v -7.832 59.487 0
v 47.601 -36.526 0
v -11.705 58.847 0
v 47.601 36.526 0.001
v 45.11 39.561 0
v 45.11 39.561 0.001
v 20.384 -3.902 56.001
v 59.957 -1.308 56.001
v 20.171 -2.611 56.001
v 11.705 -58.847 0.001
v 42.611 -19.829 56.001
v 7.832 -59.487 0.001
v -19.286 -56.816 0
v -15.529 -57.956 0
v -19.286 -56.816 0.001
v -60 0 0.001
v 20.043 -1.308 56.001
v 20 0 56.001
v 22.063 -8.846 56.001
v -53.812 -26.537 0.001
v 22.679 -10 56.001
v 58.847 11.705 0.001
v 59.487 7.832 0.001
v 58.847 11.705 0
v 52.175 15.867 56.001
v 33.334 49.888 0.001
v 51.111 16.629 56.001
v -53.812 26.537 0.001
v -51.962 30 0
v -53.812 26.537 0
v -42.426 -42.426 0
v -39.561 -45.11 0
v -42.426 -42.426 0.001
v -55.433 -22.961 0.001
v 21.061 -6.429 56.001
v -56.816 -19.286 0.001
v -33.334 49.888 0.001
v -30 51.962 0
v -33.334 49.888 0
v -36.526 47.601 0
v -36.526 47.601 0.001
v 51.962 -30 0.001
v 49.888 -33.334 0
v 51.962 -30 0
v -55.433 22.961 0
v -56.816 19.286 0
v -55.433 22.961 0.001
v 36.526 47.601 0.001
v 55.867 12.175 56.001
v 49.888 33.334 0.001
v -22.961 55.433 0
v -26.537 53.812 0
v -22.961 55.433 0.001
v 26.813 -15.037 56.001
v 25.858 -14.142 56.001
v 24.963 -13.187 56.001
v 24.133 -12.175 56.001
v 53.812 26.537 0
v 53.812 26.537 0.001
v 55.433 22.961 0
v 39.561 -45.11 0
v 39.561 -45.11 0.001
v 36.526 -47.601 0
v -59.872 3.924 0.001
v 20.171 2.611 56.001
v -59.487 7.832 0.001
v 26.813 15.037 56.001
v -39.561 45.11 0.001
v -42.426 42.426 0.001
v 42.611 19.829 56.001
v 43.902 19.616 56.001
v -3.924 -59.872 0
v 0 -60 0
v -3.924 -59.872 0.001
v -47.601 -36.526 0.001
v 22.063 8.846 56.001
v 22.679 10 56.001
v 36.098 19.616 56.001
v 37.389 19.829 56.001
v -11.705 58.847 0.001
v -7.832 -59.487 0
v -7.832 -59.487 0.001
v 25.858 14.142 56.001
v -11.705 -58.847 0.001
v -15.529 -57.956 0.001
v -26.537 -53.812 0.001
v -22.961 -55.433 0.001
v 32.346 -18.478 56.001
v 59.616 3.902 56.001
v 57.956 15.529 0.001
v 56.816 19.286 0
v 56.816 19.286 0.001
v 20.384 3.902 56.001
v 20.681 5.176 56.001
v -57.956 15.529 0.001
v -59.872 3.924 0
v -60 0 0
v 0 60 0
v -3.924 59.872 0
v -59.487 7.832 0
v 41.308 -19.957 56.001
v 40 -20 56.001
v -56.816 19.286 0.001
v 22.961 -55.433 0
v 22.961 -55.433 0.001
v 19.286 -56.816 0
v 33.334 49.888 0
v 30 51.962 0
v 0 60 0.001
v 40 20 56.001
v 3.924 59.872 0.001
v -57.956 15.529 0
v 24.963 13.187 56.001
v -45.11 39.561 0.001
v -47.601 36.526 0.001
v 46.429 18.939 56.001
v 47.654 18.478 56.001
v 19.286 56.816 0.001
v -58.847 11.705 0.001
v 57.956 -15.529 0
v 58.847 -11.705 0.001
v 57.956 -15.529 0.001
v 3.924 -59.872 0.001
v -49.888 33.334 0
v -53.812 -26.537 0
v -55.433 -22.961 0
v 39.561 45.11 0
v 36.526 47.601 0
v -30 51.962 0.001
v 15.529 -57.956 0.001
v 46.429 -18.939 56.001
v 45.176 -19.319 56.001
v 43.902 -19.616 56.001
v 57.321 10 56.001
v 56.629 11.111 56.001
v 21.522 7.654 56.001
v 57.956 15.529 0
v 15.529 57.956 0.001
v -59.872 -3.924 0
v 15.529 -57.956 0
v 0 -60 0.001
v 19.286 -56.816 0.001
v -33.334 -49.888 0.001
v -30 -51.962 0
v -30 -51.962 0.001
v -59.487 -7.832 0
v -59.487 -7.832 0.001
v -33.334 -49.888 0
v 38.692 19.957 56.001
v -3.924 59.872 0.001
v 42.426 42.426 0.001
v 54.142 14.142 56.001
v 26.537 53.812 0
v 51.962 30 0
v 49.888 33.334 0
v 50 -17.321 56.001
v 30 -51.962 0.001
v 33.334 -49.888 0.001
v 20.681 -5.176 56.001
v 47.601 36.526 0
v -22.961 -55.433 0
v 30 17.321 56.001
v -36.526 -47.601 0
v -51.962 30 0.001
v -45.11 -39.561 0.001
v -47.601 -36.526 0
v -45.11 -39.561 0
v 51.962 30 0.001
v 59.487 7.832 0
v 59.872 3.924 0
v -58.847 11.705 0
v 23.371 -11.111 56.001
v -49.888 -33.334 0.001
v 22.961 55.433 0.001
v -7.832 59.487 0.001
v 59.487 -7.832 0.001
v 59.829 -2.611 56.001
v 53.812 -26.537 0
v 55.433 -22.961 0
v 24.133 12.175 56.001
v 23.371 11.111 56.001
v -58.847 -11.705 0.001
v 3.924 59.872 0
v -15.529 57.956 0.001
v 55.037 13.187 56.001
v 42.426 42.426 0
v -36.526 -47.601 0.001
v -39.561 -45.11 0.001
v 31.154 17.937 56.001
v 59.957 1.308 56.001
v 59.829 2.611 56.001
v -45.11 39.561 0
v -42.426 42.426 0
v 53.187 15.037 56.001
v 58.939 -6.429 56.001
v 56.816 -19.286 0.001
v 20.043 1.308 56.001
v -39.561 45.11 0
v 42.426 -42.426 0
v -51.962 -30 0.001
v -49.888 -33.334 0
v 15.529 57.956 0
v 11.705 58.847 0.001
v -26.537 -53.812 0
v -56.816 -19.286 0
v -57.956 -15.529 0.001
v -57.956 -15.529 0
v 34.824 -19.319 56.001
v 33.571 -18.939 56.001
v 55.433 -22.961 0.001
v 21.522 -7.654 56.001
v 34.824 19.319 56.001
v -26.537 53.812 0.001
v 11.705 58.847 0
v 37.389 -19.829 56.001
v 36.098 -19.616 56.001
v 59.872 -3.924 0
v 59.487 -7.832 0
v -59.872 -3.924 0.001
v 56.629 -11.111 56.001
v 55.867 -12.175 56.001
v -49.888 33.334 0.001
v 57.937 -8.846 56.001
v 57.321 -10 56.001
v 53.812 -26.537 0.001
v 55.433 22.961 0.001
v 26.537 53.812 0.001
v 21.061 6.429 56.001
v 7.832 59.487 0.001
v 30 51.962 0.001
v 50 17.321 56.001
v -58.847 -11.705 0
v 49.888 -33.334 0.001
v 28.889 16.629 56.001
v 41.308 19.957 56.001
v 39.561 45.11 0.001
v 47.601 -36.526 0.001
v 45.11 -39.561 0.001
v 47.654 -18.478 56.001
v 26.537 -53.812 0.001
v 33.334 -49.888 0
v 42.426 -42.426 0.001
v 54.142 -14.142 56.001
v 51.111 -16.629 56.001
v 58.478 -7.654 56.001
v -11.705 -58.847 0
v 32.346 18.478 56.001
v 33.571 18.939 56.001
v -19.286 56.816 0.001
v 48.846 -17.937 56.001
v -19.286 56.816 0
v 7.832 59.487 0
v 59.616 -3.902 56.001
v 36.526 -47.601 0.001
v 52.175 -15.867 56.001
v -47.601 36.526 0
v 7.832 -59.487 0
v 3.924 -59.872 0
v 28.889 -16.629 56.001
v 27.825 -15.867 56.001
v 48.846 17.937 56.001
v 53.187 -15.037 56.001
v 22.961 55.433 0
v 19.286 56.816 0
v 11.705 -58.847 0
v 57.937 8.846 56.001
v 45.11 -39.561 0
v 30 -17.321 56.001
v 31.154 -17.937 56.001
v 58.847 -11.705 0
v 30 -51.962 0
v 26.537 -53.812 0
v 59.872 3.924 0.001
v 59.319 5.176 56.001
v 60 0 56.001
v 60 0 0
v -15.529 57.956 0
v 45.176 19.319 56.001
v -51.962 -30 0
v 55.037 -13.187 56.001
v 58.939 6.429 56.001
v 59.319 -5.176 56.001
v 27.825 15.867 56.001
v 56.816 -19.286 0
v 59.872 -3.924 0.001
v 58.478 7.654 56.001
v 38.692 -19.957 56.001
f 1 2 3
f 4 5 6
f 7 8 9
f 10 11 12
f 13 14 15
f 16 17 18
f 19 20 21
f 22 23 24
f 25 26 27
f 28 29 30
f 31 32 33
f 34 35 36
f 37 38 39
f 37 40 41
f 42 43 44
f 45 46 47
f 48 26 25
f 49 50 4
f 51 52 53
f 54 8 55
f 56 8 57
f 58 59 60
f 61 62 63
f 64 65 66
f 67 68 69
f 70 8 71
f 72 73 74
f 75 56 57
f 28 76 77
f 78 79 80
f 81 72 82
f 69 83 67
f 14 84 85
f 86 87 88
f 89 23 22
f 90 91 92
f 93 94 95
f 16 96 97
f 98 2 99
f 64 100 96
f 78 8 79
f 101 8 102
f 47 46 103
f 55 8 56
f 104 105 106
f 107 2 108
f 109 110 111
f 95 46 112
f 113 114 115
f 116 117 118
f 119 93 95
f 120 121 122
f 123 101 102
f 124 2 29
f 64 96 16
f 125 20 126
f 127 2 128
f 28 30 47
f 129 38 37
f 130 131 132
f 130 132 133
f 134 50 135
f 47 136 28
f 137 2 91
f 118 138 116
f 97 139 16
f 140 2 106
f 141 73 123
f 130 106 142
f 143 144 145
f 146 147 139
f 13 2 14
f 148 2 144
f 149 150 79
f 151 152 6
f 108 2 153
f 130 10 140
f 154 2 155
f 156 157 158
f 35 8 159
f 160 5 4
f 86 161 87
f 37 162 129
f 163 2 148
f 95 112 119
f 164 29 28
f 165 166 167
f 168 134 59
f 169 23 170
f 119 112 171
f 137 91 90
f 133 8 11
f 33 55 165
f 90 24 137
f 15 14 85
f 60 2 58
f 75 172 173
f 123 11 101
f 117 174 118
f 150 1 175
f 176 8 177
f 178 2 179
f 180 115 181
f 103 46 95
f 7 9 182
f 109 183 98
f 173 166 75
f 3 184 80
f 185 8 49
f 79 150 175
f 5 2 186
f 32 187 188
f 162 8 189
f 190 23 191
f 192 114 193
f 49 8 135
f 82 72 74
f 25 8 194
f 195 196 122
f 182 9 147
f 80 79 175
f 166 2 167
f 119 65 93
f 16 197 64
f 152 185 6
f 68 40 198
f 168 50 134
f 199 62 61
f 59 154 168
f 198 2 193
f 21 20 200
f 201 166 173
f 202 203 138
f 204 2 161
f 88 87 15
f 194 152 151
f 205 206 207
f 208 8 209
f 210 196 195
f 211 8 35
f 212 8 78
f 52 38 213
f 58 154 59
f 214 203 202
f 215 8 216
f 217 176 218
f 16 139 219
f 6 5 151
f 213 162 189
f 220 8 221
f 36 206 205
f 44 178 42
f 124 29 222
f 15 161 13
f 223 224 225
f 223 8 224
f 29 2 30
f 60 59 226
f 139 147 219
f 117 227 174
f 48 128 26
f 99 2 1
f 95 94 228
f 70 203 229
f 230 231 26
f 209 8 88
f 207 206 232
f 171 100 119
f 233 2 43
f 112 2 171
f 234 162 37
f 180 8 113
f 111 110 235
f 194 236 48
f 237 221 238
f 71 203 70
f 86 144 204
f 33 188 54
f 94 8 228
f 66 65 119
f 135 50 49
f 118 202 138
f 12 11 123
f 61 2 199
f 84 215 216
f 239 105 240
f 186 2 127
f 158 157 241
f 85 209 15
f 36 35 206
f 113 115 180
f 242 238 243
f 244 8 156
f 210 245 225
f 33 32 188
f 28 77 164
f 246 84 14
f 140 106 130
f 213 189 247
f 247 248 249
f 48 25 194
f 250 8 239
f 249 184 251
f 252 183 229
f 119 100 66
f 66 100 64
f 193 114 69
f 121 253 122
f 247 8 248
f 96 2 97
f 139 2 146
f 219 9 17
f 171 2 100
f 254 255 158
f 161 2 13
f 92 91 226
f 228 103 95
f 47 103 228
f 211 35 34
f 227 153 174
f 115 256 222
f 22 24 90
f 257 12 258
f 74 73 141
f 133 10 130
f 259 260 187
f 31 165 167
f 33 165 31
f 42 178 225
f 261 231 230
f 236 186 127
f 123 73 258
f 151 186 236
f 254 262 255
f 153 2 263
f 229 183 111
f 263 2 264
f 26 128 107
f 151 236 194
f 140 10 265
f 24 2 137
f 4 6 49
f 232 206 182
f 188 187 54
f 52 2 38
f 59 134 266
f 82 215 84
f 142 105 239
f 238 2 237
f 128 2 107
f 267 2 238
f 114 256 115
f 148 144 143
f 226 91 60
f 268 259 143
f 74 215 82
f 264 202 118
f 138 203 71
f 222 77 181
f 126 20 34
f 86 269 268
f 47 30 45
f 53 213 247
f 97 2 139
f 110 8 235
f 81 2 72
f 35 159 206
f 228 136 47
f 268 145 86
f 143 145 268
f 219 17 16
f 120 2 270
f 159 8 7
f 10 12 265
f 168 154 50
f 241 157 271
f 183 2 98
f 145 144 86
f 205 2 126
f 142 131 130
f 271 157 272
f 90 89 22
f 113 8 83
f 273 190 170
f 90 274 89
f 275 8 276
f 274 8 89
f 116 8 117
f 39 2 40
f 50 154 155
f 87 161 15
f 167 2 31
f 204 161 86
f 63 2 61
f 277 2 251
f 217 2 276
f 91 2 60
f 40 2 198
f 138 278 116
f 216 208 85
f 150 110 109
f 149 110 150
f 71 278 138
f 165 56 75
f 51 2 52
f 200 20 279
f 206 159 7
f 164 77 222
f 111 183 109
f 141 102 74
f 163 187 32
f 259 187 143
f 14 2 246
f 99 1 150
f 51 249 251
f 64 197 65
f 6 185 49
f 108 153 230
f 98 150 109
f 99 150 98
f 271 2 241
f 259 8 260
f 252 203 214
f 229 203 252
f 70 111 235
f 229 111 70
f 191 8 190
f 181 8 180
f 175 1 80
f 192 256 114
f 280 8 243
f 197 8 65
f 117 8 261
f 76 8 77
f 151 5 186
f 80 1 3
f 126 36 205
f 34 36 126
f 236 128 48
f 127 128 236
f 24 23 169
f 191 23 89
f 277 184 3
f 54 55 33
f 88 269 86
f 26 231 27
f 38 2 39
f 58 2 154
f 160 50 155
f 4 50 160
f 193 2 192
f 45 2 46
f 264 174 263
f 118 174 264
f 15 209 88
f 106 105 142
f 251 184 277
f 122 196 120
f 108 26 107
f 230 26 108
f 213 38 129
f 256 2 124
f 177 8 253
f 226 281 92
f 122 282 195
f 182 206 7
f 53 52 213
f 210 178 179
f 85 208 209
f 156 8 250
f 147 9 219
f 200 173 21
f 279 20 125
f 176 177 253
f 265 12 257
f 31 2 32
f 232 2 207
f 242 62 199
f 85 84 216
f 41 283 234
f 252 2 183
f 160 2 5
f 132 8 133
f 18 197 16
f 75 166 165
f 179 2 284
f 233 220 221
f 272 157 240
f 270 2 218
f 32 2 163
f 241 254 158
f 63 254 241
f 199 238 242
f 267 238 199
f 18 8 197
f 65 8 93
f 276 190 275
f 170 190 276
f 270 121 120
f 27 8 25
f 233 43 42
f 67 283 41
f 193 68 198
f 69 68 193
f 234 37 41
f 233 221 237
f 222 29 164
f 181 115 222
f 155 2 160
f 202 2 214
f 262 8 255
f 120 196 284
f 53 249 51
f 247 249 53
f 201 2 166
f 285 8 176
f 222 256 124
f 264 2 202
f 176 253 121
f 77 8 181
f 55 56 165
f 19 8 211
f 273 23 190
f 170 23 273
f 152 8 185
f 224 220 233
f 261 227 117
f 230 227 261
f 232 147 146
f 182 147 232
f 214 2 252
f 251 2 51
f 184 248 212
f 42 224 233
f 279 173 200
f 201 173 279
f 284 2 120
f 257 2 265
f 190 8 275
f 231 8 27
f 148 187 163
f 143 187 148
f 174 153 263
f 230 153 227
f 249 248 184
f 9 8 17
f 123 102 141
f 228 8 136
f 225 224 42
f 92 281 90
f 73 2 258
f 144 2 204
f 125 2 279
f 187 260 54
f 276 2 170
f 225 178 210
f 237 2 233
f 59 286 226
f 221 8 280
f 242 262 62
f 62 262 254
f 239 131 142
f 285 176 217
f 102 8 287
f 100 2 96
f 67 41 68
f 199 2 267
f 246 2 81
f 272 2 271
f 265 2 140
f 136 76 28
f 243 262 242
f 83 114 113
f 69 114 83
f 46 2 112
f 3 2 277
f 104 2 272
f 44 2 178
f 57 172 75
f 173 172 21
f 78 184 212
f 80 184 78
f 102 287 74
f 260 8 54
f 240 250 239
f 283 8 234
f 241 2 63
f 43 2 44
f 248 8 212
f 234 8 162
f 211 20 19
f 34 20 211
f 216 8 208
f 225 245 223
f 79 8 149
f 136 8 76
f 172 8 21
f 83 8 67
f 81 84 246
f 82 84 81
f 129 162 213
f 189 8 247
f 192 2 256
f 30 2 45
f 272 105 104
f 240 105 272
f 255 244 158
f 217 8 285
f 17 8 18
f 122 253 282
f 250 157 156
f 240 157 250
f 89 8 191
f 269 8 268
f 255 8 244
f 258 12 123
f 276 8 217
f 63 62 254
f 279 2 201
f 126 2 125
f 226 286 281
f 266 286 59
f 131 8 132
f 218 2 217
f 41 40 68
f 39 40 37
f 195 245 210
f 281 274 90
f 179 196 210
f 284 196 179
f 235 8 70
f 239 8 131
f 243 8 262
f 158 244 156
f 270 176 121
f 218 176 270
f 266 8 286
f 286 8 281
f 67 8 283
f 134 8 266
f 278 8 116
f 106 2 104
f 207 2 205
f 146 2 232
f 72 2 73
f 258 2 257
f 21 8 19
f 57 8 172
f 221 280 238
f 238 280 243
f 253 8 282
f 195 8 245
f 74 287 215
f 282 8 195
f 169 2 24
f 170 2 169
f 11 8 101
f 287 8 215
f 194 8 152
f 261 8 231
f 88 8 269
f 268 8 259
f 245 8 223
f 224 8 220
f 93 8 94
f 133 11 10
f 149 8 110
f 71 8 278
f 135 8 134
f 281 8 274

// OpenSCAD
// two thin disks whose rims touch in plan at x = 60 (thing 3061872, a funnel): one tangential
// corner, every bridge a loop from it back to it.
$fn = 96;
hull() {
  cylinder(r = 60, h = 0.001);
  translate([40, 0, 56]) cylinder(r = 20, h = 0.001);
}
